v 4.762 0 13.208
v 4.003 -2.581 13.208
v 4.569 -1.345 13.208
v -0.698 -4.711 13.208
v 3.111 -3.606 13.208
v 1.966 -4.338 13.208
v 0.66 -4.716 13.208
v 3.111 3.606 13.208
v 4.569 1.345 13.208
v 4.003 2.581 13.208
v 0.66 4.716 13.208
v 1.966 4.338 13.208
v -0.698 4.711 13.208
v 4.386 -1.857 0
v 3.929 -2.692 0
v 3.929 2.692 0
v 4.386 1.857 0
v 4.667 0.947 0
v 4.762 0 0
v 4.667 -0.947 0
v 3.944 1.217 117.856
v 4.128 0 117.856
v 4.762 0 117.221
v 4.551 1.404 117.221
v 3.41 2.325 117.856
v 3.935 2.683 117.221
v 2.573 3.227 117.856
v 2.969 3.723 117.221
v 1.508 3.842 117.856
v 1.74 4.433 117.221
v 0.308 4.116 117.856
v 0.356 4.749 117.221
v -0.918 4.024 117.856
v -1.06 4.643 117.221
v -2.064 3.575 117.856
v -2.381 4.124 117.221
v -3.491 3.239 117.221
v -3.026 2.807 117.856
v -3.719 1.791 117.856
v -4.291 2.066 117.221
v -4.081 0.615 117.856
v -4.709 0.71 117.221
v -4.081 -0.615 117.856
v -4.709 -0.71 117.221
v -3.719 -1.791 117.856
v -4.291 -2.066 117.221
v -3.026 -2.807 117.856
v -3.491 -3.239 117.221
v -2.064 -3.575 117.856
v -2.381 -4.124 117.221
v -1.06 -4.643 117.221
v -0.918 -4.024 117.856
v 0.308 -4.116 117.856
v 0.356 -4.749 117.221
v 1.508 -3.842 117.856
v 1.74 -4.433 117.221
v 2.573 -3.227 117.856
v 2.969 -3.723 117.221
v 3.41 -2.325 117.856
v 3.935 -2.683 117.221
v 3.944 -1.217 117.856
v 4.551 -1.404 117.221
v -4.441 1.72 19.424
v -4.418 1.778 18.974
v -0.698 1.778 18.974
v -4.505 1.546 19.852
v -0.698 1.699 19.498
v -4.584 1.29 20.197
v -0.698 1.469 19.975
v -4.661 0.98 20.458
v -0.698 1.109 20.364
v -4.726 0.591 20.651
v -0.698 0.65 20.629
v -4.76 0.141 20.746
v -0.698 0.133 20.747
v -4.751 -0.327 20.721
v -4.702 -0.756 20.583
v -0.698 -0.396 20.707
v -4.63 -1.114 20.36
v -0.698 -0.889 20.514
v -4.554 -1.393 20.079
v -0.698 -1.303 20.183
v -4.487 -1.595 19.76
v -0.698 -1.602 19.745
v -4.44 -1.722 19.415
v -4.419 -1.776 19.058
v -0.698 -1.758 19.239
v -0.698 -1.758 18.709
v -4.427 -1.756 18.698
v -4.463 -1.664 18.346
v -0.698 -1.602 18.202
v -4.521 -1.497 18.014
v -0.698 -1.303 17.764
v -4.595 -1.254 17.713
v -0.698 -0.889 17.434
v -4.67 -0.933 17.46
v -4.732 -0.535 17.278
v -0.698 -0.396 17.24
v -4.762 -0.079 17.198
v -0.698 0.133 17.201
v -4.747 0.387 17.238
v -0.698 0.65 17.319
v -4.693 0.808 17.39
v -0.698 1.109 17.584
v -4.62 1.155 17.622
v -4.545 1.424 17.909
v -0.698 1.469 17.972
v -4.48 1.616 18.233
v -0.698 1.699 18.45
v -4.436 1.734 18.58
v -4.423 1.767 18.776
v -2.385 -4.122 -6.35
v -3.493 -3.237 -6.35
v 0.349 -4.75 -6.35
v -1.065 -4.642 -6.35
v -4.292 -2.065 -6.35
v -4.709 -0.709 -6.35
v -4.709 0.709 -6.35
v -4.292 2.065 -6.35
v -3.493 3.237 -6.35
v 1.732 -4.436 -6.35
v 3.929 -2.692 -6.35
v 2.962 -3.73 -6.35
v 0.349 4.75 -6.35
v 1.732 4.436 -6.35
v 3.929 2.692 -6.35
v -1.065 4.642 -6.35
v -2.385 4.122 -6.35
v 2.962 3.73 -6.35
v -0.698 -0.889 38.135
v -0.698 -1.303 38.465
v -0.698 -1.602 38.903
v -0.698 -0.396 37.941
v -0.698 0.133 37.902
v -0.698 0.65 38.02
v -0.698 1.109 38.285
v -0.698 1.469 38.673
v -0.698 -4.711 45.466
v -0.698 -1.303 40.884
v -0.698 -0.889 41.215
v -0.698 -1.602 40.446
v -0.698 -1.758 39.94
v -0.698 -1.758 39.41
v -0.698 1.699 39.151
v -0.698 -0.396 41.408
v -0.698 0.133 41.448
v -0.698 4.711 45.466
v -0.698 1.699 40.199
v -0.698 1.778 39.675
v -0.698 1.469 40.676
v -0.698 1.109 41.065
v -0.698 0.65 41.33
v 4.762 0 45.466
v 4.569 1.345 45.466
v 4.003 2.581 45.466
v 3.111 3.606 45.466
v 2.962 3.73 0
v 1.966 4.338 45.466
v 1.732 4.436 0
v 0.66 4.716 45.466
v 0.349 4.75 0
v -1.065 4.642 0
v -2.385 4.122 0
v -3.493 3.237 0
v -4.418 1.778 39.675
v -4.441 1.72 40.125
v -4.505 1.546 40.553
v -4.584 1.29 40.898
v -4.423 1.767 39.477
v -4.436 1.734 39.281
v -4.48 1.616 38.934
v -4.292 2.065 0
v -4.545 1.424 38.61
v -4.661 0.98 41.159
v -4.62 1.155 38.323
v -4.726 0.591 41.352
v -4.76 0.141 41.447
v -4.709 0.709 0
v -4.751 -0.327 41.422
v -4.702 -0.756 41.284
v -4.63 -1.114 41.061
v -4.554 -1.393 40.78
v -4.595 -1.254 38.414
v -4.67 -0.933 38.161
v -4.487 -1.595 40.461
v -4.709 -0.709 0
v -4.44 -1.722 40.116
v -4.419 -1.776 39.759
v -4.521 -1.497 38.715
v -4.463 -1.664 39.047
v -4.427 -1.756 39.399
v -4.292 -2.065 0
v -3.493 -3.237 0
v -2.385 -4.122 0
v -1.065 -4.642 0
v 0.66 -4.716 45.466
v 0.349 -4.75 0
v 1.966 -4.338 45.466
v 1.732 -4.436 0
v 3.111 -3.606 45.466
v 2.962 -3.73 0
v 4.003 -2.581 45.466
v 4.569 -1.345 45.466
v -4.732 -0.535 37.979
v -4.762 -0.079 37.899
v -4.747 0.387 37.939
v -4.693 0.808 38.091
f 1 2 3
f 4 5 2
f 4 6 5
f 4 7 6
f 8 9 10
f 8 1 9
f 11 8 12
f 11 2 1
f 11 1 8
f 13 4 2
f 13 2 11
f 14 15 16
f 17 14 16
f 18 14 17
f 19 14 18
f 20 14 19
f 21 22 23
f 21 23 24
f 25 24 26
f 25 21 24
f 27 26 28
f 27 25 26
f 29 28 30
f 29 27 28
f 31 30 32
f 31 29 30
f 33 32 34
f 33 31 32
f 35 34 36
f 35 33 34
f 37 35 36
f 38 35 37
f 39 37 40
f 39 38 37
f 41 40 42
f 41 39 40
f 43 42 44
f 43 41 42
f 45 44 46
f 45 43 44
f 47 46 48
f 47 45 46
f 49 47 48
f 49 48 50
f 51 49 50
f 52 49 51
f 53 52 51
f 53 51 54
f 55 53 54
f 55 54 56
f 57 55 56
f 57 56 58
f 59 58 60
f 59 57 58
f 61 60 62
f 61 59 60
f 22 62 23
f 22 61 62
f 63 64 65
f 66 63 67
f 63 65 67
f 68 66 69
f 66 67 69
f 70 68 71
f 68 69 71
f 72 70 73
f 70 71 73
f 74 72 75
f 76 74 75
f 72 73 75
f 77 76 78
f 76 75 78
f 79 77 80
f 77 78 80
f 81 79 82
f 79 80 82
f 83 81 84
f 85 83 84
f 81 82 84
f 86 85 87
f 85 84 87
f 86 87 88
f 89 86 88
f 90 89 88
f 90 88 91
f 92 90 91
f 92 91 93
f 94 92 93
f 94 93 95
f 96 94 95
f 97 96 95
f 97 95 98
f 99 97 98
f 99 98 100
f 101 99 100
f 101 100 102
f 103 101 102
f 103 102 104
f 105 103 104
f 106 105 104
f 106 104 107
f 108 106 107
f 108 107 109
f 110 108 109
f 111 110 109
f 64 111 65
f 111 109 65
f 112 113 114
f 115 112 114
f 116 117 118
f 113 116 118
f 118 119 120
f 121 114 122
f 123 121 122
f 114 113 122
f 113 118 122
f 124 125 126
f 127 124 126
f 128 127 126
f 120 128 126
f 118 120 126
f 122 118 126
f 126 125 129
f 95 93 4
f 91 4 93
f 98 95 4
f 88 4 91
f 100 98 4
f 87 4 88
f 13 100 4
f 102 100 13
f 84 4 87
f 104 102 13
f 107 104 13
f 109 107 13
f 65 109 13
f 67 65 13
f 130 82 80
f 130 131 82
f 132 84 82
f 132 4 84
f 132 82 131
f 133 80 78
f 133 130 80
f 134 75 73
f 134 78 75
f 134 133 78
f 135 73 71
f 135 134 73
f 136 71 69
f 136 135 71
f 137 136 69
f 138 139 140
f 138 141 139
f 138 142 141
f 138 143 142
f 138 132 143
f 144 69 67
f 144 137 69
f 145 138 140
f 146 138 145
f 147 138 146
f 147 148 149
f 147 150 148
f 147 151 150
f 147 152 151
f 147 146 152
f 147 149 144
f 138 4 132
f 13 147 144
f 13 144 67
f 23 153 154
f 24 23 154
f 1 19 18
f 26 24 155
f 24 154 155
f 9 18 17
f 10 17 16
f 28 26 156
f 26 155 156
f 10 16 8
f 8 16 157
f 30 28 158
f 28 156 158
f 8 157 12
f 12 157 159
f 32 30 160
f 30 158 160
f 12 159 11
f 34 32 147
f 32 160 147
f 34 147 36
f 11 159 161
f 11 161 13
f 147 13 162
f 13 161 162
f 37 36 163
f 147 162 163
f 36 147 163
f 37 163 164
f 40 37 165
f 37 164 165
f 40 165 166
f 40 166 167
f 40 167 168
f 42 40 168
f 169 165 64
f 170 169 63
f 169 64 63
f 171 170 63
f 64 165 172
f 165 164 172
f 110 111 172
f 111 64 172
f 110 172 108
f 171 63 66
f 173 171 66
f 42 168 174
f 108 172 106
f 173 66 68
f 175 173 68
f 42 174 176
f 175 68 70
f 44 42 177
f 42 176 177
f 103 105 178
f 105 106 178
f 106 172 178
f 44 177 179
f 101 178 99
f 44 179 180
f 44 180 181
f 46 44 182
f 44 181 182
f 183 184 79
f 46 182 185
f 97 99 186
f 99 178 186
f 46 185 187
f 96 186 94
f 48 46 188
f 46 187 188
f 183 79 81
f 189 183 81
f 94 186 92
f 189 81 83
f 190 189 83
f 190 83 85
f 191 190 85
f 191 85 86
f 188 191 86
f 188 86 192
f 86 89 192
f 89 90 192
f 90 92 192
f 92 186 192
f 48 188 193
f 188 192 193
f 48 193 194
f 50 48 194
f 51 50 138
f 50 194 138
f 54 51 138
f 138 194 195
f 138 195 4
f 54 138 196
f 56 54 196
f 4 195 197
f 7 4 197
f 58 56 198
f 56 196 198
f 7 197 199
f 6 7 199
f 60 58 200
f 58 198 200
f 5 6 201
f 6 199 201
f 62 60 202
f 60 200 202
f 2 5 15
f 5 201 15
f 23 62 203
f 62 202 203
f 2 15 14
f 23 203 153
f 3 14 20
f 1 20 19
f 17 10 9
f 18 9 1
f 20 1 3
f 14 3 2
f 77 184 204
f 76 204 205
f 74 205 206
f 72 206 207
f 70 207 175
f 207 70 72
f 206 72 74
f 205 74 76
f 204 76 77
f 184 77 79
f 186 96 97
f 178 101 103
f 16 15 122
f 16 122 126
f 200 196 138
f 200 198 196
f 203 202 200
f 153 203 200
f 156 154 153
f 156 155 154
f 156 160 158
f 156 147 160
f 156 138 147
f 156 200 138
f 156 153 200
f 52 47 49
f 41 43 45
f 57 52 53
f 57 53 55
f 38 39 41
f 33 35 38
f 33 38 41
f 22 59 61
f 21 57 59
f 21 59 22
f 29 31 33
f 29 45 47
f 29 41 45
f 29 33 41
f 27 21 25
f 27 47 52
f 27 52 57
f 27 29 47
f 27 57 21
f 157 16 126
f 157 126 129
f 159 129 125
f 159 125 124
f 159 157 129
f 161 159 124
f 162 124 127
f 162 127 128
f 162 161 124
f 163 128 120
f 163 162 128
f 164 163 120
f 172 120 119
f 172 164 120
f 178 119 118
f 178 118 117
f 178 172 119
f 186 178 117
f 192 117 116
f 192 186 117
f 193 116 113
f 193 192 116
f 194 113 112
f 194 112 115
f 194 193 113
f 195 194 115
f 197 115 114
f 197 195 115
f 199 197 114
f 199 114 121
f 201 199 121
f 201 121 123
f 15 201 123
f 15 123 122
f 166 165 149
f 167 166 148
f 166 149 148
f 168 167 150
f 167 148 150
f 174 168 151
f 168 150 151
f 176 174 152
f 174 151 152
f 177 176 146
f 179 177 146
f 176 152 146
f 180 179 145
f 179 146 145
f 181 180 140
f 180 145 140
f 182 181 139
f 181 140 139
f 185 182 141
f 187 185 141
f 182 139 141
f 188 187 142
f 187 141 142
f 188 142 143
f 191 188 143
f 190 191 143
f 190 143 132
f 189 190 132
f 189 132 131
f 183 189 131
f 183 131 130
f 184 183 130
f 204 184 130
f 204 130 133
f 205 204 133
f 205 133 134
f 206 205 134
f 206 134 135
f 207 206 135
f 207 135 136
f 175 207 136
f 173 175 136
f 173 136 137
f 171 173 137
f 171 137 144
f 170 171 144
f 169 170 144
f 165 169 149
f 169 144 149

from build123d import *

# Parameters (mm, degrees)
F0_R     = 4.7625
F1_DEPTH = 117.856
F2_W     = 9.525
F2_H     = 32.258
F3_DEPTH = 25.4
F4_DEPTH = 0.6985
F5_R     = 1.778
F6_DEPTH = 25.4
F8_DEPTH = 6.35
F9_SIZE  = 0.635


with BuildPart() as f1:
    # F0 (on Top) → F1 (new body)
    with BuildSketch(Plane.XY):
        Circle(F0_R)
    extrude(amount=F1_DEPTH)

    # F2 (on Right) → F3 (cut)
    with BuildSketch(Plane.YZ):
        with Locations((0, 29.337)):
            Rectangle(F2_W, F2_H)
    extrude(amount=F3_DEPTH, mode=Mode.SUBTRACT)

    # F2 (on Right) → F4 (cut)
    with BuildSketch(Plane.YZ):
        with Locations((0, 29.337)):
            Rectangle(F2_W, F2_H)
    extrude(amount=-F4_DEPTH, mode=Mode.SUBTRACT)

    # F5 (on face) → F6 (cut)
    with BuildSketch(Plane.YZ):
        with Locations((0, 39.6748)):
            Circle(F5_R)
        with Locations((0, 18.9738)):
            Circle(F5_R)
    extrude(amount=-F6_DEPTH, mode=Mode.SUBTRACT)

    # F7 (on face) → F8 (join)
    with BuildSketch(Plane.XY):
        with BuildLine():
            Line((3.928686, -2.691995), (3.928686, 2.691995))
            ThreePointArc((3.928686, 2.691995), (-4.7625, 0), (3.928686, -2.691995))
        make_face()
    extrude(amount=-F8_DEPTH)

    # F9
    f9_edges = [f1.edges().sort_by_distance(p)[0] for p in [
        (-4.7625, 0, 117.856),
    ]]
    chamfer(f9_edges, length=F9_SIZE)


solid = f1.part
